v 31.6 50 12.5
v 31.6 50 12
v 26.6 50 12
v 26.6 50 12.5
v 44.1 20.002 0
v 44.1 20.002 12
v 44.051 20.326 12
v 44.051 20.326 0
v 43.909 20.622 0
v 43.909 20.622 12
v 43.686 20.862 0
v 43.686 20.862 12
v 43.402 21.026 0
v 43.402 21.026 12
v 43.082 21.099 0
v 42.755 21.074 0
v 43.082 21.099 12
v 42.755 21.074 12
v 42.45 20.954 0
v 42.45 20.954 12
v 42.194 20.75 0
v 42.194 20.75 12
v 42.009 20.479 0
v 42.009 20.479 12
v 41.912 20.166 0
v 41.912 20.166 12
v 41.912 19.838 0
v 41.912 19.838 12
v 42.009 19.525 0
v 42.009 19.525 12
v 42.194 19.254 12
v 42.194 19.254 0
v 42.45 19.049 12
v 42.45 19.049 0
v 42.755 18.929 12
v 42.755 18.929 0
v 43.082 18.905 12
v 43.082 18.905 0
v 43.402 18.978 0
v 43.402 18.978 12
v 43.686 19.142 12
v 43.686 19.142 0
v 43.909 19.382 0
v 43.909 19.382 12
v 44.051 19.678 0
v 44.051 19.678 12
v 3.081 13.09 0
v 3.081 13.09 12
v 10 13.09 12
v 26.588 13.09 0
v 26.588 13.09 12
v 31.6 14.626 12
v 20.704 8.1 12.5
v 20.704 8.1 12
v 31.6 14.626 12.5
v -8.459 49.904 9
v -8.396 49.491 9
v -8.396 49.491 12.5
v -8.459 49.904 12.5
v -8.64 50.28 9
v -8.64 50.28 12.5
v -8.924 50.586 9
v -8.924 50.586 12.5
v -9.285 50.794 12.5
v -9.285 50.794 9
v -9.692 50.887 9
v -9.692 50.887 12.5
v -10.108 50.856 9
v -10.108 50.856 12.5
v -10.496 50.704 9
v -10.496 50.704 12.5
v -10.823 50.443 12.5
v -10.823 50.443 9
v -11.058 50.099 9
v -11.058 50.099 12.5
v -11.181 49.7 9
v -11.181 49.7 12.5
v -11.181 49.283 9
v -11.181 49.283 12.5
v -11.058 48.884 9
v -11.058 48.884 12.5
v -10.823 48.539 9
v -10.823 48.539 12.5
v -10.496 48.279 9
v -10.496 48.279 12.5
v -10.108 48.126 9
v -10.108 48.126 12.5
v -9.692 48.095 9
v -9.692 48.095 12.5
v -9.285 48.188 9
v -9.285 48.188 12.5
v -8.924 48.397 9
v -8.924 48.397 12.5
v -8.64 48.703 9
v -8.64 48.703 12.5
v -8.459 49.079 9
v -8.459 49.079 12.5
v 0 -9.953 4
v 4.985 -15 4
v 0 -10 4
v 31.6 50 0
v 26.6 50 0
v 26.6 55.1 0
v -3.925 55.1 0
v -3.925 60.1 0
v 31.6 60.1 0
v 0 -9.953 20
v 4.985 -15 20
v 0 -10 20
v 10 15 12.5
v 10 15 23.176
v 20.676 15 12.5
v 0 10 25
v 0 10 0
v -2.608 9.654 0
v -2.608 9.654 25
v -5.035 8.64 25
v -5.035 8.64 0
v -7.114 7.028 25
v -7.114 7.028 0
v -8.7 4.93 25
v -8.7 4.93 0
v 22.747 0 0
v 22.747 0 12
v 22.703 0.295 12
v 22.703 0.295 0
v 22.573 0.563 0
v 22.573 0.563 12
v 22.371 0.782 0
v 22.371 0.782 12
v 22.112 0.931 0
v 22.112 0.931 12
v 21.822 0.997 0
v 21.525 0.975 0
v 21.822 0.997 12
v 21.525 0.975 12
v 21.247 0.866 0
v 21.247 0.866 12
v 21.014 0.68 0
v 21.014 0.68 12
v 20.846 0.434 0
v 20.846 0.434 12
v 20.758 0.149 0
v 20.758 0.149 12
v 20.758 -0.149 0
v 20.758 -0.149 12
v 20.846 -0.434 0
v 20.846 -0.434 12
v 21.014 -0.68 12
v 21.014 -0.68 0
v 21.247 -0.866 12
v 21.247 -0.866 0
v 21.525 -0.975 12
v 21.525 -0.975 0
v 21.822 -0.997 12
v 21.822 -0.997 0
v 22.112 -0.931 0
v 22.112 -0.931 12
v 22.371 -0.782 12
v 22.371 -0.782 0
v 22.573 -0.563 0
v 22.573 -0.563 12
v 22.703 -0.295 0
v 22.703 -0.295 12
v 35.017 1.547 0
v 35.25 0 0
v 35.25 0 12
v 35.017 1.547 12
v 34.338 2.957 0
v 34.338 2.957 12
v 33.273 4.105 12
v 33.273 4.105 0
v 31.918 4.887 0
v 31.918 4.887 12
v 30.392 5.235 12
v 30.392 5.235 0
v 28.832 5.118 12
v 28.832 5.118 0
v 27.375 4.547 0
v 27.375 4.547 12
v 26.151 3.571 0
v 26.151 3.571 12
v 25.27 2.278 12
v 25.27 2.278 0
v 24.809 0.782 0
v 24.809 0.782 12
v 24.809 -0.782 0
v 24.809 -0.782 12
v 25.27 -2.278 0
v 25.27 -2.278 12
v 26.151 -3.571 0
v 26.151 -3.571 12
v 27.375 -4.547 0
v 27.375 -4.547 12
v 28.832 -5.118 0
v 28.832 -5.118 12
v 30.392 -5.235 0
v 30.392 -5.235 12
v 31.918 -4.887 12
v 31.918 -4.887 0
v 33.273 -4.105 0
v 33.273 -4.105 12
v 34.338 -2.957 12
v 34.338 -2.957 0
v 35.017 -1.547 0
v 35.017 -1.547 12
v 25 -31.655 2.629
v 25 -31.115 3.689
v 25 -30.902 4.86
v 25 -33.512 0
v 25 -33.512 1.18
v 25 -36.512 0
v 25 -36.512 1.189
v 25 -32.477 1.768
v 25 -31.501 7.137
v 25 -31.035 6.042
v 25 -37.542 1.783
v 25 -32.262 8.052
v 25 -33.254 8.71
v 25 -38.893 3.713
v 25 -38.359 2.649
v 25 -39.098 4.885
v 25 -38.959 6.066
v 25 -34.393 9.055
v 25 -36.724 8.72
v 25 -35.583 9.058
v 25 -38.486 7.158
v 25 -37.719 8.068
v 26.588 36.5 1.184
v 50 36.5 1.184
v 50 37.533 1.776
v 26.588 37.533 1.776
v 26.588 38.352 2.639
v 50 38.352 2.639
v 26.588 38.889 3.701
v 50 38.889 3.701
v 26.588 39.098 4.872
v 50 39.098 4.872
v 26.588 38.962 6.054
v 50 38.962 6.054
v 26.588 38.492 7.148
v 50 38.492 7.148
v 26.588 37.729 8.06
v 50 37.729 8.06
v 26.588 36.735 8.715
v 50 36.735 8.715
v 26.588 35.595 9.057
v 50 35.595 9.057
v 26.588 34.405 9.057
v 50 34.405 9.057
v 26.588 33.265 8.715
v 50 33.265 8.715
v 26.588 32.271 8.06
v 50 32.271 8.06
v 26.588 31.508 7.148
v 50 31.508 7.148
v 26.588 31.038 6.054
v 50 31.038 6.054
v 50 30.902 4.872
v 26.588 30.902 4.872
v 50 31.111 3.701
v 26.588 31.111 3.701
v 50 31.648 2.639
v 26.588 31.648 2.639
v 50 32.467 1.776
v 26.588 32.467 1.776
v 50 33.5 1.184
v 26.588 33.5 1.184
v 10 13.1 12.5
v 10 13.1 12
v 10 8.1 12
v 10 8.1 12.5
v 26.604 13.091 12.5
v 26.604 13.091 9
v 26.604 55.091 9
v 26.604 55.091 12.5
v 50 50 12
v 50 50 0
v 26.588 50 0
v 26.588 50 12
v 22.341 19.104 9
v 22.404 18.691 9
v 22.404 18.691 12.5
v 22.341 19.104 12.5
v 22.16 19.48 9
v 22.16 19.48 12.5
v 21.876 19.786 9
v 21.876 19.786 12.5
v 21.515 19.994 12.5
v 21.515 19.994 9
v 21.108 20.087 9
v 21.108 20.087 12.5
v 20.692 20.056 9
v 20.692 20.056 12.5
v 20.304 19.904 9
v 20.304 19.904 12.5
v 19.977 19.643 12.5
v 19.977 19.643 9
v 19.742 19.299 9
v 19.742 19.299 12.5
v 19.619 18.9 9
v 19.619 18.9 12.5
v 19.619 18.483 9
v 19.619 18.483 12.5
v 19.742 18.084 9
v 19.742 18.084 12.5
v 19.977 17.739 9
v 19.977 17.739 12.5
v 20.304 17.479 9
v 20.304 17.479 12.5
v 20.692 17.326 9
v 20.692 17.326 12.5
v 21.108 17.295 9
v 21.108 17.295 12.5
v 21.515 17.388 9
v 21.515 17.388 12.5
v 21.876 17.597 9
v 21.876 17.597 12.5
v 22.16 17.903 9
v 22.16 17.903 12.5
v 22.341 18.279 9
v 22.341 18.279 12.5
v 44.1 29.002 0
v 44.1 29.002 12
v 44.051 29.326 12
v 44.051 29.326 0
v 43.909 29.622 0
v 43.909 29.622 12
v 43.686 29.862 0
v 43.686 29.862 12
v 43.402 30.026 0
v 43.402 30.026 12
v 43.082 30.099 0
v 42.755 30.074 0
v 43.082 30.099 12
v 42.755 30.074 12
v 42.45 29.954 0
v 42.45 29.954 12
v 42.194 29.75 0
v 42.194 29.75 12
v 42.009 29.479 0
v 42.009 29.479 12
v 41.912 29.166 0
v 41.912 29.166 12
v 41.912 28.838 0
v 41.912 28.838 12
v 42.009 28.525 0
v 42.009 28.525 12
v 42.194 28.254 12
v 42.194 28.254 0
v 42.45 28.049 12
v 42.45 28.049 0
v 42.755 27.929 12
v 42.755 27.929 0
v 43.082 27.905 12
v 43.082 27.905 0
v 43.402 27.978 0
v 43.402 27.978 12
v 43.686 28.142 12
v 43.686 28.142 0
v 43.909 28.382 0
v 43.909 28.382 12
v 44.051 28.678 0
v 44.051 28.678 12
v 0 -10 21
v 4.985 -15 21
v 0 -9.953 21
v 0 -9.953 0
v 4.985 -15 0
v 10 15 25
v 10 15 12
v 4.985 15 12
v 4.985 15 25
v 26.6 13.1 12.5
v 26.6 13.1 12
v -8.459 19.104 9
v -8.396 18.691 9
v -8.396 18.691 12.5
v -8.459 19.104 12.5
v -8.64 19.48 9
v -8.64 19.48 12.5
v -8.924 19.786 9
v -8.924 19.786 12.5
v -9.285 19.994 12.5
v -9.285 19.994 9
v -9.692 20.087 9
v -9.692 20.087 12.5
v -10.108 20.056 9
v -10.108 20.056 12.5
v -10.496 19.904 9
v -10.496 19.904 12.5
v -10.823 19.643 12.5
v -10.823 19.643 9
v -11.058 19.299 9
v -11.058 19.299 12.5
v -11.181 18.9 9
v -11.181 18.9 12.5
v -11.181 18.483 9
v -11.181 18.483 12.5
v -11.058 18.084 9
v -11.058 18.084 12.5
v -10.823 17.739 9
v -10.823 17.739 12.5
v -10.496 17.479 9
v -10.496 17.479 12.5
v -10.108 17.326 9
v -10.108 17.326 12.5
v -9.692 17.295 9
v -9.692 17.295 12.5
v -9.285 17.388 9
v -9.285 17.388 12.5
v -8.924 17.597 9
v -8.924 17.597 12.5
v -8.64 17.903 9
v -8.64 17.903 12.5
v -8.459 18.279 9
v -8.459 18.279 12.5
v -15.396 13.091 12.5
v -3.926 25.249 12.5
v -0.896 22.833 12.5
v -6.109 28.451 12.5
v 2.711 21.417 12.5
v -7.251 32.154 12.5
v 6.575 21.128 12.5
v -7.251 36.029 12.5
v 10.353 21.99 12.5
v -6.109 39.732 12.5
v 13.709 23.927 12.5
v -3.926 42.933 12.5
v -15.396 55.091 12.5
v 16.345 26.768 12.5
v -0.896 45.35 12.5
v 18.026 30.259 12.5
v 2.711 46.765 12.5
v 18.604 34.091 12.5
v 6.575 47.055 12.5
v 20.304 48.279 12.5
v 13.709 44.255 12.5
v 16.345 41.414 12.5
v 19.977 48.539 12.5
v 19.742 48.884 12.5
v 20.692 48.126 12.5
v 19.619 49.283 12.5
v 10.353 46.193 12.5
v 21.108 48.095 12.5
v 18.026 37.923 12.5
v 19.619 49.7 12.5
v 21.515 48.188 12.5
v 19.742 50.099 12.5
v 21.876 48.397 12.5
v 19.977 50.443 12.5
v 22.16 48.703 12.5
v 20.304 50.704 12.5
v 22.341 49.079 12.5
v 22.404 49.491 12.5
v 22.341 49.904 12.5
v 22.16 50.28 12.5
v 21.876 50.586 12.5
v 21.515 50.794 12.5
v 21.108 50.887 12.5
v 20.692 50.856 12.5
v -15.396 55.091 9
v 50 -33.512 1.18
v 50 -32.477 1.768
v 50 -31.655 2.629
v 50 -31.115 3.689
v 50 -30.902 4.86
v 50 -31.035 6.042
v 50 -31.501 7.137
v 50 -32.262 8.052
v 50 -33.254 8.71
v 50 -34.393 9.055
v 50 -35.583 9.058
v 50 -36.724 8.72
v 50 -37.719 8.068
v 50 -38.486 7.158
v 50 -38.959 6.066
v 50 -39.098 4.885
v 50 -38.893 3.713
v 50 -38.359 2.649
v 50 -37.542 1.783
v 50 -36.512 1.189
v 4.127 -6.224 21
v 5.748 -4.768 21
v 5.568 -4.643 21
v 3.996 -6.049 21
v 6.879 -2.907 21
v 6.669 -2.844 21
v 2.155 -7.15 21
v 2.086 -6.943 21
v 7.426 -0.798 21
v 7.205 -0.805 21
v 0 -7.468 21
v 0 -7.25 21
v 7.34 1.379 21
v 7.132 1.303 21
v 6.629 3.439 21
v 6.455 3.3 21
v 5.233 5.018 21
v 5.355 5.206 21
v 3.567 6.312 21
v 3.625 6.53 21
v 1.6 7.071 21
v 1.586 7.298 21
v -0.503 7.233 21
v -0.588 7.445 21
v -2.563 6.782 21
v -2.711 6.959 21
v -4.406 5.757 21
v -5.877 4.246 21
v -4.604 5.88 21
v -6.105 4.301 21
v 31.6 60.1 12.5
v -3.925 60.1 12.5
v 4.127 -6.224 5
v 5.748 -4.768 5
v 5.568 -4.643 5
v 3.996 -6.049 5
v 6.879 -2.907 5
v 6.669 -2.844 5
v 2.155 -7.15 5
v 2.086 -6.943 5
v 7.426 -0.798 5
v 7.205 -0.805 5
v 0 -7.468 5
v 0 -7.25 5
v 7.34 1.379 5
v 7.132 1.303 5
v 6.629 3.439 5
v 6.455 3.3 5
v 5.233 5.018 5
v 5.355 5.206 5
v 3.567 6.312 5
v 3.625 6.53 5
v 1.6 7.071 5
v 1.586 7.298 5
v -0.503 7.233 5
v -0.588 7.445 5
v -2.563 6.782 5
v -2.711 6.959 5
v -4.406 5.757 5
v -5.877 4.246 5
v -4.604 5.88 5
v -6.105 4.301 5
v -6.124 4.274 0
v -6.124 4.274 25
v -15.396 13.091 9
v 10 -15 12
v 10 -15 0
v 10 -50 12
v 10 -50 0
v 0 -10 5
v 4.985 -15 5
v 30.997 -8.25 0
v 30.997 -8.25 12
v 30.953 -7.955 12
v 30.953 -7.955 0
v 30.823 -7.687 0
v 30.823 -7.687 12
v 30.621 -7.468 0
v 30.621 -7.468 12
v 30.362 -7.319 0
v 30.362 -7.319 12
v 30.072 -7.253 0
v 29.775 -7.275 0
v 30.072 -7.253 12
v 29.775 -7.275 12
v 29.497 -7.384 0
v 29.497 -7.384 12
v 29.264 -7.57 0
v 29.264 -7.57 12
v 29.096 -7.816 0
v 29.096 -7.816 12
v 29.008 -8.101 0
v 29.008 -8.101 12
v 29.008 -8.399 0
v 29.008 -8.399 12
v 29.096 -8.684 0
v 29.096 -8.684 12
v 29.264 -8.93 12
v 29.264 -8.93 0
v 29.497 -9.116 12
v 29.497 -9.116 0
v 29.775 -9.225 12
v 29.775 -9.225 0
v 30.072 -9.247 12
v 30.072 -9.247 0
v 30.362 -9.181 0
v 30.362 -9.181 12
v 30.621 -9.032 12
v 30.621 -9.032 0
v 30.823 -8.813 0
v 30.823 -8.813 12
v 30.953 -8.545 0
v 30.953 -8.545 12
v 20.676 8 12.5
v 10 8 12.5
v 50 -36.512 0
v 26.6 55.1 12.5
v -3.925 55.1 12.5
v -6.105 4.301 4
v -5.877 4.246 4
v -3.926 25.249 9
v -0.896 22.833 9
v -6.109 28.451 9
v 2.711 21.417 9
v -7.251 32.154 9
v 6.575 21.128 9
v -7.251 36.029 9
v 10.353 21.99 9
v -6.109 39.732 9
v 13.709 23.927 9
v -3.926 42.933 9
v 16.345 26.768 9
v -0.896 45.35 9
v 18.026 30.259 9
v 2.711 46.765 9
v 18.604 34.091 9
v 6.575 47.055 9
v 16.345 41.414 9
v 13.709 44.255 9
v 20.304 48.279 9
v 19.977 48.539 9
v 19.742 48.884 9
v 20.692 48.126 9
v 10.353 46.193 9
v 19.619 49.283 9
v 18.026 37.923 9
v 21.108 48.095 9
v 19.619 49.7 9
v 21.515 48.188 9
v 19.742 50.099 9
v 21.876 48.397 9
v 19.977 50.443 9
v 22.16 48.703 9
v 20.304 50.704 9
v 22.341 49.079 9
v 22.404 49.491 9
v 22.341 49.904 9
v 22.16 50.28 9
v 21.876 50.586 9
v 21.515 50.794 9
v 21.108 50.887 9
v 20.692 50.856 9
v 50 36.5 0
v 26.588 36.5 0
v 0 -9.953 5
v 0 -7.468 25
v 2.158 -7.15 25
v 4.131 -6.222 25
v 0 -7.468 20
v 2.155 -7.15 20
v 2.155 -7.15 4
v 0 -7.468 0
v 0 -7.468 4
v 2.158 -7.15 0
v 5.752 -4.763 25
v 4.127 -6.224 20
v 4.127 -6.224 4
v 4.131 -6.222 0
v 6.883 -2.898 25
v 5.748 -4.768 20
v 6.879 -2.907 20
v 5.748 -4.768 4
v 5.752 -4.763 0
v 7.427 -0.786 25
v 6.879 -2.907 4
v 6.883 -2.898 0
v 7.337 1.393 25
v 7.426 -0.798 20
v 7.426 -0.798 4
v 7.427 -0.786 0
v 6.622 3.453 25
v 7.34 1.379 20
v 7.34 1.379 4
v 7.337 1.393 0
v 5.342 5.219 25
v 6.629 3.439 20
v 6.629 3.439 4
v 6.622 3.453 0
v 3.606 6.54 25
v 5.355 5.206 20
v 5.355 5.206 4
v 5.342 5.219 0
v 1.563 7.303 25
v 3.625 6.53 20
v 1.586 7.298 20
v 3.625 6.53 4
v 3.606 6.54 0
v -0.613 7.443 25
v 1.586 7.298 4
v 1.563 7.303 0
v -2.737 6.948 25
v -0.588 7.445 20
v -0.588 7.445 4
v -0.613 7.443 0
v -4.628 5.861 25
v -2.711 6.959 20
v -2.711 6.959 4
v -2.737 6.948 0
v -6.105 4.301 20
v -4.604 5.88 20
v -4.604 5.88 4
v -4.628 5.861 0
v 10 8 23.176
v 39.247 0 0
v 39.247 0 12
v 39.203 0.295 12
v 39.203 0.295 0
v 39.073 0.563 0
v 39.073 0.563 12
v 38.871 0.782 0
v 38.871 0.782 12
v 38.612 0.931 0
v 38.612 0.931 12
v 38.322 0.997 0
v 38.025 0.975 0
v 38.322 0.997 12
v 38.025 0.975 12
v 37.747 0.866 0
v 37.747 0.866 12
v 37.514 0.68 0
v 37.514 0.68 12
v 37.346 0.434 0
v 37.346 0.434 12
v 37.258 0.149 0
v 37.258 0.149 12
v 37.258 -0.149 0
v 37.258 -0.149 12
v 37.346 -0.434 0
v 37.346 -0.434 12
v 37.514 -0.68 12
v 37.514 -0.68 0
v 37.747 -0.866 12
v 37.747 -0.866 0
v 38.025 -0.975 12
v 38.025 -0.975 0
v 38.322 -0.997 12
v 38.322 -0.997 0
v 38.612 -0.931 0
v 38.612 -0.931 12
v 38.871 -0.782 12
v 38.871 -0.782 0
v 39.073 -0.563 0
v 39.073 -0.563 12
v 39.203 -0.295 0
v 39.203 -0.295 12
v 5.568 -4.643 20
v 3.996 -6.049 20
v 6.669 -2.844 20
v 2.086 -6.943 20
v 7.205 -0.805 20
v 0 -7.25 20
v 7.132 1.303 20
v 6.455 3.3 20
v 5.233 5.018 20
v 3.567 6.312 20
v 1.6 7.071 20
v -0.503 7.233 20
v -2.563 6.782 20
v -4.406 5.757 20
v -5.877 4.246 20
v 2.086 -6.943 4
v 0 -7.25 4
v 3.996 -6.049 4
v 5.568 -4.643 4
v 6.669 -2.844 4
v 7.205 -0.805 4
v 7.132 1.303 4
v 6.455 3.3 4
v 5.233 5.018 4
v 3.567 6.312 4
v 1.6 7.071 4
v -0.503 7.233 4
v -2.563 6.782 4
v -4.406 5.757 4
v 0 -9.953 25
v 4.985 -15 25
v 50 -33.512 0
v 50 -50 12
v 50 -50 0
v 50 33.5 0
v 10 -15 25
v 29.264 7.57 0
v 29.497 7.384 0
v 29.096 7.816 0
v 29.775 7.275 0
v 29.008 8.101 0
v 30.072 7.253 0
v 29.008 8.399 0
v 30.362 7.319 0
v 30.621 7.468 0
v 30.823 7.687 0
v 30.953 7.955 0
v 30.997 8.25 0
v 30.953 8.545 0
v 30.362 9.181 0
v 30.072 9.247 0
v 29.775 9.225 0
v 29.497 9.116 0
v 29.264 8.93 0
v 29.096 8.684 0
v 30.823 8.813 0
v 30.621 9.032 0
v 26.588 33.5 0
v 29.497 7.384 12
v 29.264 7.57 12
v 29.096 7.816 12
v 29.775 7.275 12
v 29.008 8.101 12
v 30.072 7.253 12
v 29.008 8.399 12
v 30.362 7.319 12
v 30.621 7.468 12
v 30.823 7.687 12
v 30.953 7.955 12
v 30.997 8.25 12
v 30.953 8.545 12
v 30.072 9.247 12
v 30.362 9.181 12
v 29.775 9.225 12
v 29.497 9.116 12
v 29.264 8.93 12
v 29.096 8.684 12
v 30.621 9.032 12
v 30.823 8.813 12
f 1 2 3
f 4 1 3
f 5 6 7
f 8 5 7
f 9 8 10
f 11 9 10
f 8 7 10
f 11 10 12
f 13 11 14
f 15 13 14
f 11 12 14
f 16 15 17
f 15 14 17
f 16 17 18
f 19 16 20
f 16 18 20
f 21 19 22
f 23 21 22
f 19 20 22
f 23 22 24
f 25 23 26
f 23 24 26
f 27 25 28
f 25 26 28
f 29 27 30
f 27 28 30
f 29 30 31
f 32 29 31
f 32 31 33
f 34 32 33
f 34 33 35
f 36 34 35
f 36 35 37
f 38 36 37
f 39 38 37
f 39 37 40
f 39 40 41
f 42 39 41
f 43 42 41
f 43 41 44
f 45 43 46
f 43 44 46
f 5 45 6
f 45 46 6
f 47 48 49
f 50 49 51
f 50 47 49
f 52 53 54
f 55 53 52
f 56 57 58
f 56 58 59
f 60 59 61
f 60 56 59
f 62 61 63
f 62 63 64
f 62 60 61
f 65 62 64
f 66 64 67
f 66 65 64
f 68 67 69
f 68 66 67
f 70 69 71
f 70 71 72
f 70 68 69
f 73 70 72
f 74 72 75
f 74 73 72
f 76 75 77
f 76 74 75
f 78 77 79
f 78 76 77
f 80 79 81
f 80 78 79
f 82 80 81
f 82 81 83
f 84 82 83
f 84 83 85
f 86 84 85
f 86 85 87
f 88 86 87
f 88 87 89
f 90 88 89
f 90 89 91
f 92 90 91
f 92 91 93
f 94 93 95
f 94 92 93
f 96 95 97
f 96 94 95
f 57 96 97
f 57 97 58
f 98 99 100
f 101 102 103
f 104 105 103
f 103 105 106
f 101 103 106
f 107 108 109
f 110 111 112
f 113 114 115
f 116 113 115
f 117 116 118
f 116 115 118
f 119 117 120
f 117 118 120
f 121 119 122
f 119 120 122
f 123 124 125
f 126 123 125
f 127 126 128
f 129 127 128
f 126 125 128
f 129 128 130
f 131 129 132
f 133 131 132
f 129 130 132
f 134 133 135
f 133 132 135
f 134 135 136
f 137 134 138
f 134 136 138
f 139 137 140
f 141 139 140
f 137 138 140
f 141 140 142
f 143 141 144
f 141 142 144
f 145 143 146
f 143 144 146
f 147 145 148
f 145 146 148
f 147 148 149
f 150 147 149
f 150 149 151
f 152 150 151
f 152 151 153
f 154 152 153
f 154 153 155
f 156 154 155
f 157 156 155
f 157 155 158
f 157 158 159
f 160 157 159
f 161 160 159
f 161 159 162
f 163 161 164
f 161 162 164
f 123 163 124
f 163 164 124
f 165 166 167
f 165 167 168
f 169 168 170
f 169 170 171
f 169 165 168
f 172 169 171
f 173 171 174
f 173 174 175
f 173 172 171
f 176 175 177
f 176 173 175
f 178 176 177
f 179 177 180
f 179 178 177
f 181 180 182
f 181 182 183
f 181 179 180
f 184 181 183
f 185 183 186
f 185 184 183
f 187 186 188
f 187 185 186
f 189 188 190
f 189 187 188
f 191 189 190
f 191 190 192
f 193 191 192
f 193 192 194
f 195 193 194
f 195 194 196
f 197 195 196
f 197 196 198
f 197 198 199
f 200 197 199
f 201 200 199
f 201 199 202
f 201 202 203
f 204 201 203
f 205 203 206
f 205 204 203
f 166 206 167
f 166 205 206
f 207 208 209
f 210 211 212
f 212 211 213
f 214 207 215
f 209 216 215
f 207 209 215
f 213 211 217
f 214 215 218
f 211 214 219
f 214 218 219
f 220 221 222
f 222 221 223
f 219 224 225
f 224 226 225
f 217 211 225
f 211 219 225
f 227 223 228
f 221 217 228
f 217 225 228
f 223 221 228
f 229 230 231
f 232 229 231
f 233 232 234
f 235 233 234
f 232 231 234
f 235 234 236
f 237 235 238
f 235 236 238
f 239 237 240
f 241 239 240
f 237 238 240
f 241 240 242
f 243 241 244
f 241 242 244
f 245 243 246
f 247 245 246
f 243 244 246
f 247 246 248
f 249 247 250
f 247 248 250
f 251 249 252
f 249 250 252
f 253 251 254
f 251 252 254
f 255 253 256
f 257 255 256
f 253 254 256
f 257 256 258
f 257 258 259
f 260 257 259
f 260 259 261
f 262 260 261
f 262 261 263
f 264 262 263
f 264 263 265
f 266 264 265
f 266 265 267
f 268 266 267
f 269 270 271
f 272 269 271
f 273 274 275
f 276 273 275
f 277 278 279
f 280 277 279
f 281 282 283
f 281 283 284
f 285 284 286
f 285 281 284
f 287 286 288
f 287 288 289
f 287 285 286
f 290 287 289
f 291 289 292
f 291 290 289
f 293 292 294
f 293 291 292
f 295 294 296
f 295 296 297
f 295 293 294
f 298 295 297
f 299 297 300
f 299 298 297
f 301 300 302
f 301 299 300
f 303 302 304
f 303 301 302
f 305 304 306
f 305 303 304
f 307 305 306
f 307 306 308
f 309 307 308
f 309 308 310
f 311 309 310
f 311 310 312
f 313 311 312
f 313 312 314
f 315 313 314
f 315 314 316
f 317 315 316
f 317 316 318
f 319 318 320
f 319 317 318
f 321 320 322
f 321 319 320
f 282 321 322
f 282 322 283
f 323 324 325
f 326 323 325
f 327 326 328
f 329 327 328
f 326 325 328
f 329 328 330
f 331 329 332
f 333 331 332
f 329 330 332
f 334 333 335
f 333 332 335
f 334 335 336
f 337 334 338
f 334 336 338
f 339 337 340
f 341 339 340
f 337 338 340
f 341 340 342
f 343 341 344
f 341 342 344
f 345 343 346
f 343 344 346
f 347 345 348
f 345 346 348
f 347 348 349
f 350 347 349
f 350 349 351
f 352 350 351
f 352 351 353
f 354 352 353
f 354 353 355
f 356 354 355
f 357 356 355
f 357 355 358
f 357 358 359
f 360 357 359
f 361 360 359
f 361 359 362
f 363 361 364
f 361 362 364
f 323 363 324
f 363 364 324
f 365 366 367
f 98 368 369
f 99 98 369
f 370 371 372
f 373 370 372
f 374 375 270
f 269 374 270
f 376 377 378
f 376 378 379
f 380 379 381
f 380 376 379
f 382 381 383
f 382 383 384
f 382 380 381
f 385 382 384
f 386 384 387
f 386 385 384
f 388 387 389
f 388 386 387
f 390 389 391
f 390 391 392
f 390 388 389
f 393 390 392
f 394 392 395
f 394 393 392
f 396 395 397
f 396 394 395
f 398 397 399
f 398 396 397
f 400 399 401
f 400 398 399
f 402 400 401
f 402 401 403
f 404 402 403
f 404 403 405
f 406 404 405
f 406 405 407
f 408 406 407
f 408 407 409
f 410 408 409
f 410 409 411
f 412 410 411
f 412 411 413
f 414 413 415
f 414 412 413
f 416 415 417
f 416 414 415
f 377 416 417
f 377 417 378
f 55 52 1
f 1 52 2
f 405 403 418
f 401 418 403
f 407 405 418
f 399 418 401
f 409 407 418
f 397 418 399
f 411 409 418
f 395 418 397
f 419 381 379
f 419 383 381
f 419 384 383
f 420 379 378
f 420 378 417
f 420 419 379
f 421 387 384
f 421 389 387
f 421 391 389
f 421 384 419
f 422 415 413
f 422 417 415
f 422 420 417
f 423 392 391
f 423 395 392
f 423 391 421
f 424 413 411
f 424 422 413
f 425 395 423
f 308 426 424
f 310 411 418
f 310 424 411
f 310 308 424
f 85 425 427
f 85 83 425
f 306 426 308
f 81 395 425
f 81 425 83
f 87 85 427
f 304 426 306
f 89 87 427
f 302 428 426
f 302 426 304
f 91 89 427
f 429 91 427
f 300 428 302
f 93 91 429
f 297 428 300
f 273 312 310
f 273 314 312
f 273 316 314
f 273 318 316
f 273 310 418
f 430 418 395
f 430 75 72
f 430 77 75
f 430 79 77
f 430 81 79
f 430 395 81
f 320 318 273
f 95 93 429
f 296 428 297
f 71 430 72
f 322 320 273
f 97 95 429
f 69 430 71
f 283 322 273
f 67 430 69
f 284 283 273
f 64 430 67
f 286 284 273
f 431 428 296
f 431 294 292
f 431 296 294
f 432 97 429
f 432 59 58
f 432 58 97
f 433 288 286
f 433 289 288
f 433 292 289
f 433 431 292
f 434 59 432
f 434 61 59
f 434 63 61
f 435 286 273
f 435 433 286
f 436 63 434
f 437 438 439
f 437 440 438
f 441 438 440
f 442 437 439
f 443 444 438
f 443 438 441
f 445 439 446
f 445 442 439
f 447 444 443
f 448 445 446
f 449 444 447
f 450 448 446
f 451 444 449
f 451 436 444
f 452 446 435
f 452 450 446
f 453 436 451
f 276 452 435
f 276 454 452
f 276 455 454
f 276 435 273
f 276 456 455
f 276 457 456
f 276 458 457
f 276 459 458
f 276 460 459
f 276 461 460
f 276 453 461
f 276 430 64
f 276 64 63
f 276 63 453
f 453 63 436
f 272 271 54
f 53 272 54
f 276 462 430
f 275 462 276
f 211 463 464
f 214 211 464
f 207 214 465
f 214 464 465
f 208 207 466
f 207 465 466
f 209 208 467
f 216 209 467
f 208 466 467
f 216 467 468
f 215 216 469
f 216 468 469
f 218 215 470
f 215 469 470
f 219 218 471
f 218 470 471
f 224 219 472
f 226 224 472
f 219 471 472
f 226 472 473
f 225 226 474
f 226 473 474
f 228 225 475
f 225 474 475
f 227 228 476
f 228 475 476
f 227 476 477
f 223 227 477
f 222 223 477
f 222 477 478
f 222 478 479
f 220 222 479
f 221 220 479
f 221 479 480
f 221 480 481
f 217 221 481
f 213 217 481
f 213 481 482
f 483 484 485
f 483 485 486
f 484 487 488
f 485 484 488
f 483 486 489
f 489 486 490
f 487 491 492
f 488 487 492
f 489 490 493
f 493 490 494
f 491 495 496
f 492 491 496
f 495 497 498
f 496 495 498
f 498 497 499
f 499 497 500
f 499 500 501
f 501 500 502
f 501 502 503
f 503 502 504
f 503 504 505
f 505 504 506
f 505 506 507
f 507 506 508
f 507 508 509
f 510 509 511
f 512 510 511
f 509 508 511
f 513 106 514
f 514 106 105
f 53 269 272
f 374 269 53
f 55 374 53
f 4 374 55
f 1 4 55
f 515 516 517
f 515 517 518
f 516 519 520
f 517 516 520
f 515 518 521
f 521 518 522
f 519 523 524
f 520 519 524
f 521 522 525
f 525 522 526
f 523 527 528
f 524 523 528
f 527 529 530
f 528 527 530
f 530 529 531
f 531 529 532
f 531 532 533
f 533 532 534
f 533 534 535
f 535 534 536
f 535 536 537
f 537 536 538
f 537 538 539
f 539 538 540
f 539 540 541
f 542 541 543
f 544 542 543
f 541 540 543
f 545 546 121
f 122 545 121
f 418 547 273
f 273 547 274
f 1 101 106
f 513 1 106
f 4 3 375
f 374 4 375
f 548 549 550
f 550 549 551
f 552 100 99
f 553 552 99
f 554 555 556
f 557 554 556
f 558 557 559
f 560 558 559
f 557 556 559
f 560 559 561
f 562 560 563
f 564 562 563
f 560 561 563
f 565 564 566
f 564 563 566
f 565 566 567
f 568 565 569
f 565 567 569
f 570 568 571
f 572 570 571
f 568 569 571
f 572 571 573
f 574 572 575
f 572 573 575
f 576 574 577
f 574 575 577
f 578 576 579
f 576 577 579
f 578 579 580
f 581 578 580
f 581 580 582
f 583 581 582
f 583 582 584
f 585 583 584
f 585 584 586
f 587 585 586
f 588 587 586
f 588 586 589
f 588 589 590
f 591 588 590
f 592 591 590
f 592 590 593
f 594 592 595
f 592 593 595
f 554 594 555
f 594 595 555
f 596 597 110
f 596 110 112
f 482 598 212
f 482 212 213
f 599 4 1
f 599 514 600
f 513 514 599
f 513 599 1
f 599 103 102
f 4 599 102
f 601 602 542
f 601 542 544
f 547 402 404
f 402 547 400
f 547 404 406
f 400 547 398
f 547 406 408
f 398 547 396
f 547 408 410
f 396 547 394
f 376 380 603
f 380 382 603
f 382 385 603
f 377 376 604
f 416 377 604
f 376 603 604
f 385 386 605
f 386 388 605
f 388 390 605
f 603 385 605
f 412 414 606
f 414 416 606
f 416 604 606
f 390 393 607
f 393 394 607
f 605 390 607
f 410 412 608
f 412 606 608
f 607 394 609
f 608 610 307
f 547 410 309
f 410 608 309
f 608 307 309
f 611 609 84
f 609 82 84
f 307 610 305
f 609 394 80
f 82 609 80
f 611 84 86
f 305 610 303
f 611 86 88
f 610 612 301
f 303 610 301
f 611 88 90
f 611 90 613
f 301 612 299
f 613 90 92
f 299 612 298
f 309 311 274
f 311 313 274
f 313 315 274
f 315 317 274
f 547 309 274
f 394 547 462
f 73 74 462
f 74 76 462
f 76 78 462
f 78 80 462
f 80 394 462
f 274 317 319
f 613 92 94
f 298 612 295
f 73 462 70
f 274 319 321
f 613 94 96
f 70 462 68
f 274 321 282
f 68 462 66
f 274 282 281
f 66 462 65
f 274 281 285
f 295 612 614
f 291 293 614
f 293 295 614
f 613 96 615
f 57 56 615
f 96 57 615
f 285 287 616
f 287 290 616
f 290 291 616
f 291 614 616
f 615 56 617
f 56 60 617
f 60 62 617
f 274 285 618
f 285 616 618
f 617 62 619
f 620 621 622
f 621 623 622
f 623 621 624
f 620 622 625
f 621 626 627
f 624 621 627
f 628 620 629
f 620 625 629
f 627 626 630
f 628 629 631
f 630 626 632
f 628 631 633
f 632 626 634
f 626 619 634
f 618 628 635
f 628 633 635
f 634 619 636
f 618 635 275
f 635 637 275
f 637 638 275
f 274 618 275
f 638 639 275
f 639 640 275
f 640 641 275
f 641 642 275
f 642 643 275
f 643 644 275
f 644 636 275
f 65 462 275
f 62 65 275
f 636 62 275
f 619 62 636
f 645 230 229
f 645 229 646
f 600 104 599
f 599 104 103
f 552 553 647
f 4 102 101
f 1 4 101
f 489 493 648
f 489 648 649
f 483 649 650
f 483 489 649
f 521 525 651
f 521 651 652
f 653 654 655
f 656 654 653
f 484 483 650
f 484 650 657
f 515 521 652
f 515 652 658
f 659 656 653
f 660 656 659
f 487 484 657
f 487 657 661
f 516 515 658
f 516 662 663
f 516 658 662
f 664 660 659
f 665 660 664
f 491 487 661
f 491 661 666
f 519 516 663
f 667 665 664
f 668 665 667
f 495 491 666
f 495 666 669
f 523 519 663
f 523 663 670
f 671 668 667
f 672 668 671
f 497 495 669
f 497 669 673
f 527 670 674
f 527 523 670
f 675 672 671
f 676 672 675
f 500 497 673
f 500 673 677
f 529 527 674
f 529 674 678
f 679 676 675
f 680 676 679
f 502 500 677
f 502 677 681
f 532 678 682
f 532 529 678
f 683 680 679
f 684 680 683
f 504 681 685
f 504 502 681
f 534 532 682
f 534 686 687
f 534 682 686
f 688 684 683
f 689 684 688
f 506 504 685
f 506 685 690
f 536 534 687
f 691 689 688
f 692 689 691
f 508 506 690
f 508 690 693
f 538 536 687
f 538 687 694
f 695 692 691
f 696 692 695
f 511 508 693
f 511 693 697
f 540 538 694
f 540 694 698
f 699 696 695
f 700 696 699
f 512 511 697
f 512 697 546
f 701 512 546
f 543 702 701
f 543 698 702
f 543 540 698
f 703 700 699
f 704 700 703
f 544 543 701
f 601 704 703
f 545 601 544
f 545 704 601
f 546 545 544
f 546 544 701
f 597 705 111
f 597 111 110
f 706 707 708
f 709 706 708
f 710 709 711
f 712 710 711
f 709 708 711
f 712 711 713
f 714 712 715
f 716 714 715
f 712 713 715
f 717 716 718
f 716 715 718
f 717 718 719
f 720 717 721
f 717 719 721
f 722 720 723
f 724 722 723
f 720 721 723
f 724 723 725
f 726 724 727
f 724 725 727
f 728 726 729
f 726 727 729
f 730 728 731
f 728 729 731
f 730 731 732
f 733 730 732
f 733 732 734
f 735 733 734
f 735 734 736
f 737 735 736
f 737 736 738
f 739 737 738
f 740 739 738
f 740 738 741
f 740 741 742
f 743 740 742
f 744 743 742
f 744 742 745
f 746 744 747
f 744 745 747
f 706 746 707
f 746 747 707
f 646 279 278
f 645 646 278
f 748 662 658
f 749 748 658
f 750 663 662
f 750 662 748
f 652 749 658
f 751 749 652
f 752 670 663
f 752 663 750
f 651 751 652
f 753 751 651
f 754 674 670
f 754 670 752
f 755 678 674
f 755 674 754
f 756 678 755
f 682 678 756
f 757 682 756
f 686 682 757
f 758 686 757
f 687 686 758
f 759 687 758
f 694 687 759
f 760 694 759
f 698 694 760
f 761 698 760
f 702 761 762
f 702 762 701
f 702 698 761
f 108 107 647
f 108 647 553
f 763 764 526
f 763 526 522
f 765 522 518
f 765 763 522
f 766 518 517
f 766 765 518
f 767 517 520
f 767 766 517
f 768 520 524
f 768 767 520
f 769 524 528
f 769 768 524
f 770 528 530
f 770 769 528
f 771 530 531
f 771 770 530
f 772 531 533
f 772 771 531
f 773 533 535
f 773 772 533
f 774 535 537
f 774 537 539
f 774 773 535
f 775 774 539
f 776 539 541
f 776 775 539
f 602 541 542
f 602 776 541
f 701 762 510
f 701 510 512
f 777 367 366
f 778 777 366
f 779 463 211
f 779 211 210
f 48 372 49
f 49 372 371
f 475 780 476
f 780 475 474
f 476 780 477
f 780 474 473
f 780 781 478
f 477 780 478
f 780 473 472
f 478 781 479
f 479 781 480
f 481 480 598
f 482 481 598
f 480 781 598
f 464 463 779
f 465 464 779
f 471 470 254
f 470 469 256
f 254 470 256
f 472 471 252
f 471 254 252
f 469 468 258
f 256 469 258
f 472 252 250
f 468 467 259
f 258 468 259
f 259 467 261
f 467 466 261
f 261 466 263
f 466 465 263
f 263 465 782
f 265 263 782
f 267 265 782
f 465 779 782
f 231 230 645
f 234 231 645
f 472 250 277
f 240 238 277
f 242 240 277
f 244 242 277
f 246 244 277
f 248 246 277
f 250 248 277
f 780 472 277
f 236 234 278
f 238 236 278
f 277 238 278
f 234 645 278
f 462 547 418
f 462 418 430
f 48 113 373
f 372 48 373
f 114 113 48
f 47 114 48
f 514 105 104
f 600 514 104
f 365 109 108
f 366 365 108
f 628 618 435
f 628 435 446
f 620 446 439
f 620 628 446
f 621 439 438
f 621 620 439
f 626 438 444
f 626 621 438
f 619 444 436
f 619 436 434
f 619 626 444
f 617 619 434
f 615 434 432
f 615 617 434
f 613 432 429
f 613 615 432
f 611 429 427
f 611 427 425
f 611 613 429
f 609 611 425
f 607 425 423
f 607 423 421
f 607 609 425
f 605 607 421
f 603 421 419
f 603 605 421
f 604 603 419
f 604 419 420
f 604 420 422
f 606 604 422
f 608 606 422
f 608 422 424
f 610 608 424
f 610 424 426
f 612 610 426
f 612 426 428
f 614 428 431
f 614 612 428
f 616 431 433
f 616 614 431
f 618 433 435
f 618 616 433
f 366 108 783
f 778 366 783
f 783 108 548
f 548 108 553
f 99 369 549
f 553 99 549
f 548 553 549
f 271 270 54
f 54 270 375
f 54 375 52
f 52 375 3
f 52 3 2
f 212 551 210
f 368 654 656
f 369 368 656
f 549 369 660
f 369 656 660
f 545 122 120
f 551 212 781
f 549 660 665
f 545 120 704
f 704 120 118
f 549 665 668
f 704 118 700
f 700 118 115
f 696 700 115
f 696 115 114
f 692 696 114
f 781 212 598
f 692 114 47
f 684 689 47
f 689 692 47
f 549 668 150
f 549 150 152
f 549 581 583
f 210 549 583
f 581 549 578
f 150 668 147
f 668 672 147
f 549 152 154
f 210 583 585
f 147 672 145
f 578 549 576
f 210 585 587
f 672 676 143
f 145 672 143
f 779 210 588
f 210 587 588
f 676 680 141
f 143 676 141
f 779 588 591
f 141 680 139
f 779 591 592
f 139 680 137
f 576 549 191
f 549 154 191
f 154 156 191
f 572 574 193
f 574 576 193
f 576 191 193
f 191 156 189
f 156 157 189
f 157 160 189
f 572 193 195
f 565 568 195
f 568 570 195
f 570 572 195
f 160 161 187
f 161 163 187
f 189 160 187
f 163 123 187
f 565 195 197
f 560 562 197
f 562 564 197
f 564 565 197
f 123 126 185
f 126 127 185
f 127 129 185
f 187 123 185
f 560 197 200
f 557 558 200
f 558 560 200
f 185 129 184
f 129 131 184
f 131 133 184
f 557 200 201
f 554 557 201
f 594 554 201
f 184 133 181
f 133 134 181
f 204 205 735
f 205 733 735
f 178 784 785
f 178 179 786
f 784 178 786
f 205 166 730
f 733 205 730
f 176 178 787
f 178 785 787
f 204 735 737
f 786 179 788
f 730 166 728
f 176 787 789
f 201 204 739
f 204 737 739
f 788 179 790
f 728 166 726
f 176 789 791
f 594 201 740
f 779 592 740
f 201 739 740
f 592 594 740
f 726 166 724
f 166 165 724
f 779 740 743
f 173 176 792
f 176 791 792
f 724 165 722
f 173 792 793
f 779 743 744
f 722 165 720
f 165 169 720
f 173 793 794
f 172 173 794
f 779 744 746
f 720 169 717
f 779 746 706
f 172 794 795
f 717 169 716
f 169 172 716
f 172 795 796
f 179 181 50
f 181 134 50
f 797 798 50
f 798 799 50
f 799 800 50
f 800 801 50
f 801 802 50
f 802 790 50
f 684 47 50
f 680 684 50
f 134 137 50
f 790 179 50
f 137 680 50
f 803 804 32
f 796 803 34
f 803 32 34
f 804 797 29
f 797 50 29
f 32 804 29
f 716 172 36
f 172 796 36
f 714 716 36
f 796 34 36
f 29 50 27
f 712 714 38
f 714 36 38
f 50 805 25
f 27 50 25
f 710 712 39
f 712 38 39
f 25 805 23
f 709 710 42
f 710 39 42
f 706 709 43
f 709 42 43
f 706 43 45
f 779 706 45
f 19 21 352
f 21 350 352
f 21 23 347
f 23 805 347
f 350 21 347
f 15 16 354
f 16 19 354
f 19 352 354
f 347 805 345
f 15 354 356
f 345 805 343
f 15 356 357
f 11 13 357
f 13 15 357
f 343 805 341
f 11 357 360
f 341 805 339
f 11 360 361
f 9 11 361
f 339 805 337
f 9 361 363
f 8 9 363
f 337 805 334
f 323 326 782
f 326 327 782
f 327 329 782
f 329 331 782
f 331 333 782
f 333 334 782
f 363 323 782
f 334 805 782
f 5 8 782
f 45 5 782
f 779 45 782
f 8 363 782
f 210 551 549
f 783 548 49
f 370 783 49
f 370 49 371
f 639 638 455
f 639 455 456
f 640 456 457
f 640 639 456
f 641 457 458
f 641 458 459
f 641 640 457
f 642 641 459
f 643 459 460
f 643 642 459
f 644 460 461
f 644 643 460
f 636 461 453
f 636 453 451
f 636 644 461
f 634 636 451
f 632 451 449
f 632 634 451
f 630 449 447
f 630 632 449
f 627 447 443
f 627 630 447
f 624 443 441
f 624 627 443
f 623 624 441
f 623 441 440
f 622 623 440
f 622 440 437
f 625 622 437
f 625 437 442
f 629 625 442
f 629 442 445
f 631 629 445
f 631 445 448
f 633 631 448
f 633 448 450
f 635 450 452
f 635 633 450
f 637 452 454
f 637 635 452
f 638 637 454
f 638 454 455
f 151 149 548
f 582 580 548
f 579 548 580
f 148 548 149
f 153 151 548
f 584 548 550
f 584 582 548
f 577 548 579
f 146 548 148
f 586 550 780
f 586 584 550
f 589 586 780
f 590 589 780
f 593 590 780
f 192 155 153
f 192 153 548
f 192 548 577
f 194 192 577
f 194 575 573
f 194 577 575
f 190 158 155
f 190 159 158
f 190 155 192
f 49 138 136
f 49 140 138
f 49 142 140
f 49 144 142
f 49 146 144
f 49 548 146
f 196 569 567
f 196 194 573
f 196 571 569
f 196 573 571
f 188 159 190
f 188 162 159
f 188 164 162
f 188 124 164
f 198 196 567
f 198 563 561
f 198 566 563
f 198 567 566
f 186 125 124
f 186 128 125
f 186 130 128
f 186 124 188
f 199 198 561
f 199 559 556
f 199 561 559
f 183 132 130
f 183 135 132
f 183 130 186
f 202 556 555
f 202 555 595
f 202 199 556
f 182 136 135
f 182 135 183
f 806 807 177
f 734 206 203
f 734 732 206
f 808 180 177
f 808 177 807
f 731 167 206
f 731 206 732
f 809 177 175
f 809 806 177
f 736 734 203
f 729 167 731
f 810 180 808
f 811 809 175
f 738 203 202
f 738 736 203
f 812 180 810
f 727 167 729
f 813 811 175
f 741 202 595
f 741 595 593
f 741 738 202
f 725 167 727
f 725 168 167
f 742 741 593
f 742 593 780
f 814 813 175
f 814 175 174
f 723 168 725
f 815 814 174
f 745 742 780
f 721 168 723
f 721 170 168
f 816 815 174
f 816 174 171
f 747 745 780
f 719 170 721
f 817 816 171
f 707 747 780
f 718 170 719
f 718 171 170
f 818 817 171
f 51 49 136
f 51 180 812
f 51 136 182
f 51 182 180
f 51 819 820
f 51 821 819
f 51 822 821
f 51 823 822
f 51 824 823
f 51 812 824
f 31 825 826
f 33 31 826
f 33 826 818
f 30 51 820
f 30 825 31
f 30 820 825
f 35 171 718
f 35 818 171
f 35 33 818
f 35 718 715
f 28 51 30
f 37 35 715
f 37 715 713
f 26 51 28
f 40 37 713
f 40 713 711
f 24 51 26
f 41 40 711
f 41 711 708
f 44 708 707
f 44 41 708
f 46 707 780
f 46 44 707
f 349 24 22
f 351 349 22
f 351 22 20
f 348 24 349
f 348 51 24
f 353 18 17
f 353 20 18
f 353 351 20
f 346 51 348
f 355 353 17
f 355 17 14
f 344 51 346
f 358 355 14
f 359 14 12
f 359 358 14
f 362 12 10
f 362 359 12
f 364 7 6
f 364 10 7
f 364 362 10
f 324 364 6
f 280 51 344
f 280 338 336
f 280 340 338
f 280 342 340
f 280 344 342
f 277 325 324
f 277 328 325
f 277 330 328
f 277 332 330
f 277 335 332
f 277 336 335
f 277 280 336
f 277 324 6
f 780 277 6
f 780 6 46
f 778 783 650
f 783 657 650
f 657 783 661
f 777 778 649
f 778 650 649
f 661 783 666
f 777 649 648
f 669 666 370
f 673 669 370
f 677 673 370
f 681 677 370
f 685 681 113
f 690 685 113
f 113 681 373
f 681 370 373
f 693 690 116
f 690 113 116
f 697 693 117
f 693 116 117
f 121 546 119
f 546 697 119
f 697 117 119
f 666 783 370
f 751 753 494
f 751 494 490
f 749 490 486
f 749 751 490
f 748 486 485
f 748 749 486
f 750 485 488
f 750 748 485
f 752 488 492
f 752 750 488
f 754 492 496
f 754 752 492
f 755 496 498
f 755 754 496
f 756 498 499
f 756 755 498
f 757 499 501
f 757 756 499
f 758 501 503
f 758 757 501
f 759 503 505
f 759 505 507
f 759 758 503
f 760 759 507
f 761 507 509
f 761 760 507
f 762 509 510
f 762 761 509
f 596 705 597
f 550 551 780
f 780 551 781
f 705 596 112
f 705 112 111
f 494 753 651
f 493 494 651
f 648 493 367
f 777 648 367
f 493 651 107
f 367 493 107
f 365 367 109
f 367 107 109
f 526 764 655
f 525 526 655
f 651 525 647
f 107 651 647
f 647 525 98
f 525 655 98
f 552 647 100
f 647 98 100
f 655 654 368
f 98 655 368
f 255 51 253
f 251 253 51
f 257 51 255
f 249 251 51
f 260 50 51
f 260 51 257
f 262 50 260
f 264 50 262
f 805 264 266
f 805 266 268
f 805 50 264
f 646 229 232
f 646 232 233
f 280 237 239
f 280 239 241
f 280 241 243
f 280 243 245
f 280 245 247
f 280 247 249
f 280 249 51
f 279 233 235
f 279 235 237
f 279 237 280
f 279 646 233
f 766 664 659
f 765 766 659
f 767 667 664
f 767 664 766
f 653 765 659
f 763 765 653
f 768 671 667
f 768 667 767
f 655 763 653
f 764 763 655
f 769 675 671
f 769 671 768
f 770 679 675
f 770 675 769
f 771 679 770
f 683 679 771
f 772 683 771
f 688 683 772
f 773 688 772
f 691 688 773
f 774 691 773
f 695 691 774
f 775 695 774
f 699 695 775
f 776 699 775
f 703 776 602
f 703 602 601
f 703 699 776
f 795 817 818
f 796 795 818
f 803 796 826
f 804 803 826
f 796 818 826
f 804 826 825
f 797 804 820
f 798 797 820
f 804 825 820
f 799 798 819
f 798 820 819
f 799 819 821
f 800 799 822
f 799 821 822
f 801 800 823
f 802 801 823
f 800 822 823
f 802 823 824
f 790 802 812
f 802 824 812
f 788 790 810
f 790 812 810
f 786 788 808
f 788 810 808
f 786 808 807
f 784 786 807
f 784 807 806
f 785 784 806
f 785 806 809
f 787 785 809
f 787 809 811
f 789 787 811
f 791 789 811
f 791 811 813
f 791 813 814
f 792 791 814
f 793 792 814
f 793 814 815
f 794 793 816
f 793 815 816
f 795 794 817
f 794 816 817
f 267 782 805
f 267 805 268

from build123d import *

# Parameters (mm, degrees)
SKETCH018_W     = 42
SKETCH018_H     = 42
SKETCH018_R     = 13
SKETCH018_R_2   = 1.4
PAD018_DEPTH    = 3.5
PAD020_DEPTH    = 0.5
POCKET003_DEPTH = 30
PAD022_DEPTH    = 12.5
PAD026_DEPTH    = 7
SKETCH019_W     = 42
SKETCH019_H     = 42
PAD019_DEPTH    = 12
SKETCH_R        = 5.25
PAD_DEPTH       = 12
POCKET_DEPTH    = 25
SKETCH005_R     = 1
POCKET001_DEPTH = 12
SKETCH014_R     = 1.1
POCKET002_DEPTH = 12
PAD016_DEPTH    = 1
PAD017_DEPTH    = 1
PAD015_DEPTH    = 25


with BuildPart() as pad018:
    # Sketch018 → Pad018 (new body)
    with BuildSketch(Plane(origin=(14.7, 64.62, 9), x_dir=(1, 0, 0), z_dir=(0, 0, 1))):
        with Locations((-9.096434, -30.528784)):
            Rectangle(SKETCH018_W, SKETCH018_H)
        with Locations((-9.096434, -30.528784)):
            Circle(SKETCH018_R, mode=Mode.SUBTRACT)
        with Locations((6.303566, -15.128784)):
            Circle(SKETCH018_R_2, mode=Mode.SUBTRACT)
        with Locations((6.303566, -45.928784)):
            Circle(SKETCH018_R_2, mode=Mode.SUBTRACT)
        with Locations((-24.496434, -15.128784)):
            Circle(SKETCH018_R_2, mode=Mode.SUBTRACT)
        with Locations((-24.496434, -45.928784)):
            Circle(SKETCH018_R_2, mode=Mode.SUBTRACT)
    extrude(amount=PAD018_DEPTH)


with BuildPart() as pocket003:
    # Sketch020 → Pad020 (new body)
    with BuildSketch(Plane.XY.offset(12)):
        Polygon((26.6, 13.1), (10, 13.1), (10, 8.1), (31.6, 8.1), (31.6, 50), (26.6, 50), align=None)
    extrude(amount=PAD020_DEPTH)

    # Sketch021 → Pocket003 (cut)
    with BuildSketch(Plane.XY.offset(12.5)):
        Polygon((20.278515, 7.845065), (31.887259, 14.79844), (31.887259, 7.845065), align=None)
    extrude(amount=-POCKET003_DEPTH, mode=Mode.SUBTRACT)


with BuildPart() as pad022:
    # Sketch024 → Pad022 (new body)
    with BuildSketch(Plane.XY):
        Polygon((26.6, 50), (31.6, 50), (31.6, 60.1), (-3.925276, 60.1), (-3.925276, 55.1), (26.6, 55.1), align=None)
    extrude(amount=PAD022_DEPTH)


with BuildPart() as pad026:
    # Sketch028 → Pad026 (new body)
    with BuildSketch(Plane(origin=(0, 8, -14), x_dir=(1, 0, 0), z_dir=(0, -1, 0))):
        Polygon((10, 37.176065), (10, 26.5), (20.676065, 26.5), align=None)
    extrude(amount=-PAD026_DEPTH)


with BuildPart() as cut001:
    # Sketch019 → Pad019 (new body)
    with BuildSketch(Plane.XY):
        with Locations((5.587691, 34.090154)):
            Rectangle(SKETCH019_W, SKETCH019_H)
    extrude(amount=PAD019_DEPTH)


with BuildPart() as pocket002:
    # Sketch → Pad (new body)
    with BuildSketch(Plane.XY):
        Polygon((50, -50), (50, 50), (10, 50), (10, 20), (10, -13.385166), (10, -50), align=None)
        with Locations((30, 0)):
            Circle(SKETCH_R, mode=Mode.SUBTRACT)
    extrude(amount=PAD_DEPTH)

    # Sketch001 → Pocket (cut)
    with BuildSketch(Plane.YZ.offset(50)):
        with BuildLine():
            Line((-33.511602, 1.179703), (-33.511602, 0))
            Line((-33.511602, 0), (-36.511602, 0))
            Line((-36.511602, 0), (-36.511602, 1.188825))
            ThreePointArc((-33.511602, 1.179703), (-34.987533, 9.099981), (-36.511602, 1.188825))
        make_face()
        with BuildLine():
            Line((36.5, 1.184243), (36.5, 0))
            Line((36.5, 0), (33.5, 0))
            Line((33.5, 0), (33.5, 1.184243))
            ThreePointArc((36.5, 1.184243), (35, 9.1), (33.5, 1.184243))
        make_face()
    extrude(amount=-POCKET_DEPTH, mode=Mode.SUBTRACT)

    # Sketch005 → Pocket001 (cut)
    with BuildSketch(Plane.XY.offset(12)):
        with Locations((29.99715, 8.25)):
            Circle(SKETCH005_R)
        with Locations((21.74715, 0)):
            Circle(SKETCH005_R)
        with Locations((38.24715, 0)):
            Circle(SKETCH005_R)
        with Locations((29.99715, -8.25)):
            Circle(SKETCH005_R)
    extrude(amount=-POCKET001_DEPTH, mode=Mode.SUBTRACT)

    # Sketch014 → Pocket002 (cut)
    with BuildSketch(Plane.XY.offset(12)):
        with Locations((43, 29.001852)):
            Circle(SKETCH014_R)
        with Locations((43, 20.001852)):
            Circle(SKETCH014_R)
    extrude(amount=-POCKET002_DEPTH, mode=Mode.SUBTRACT)


with BuildPart() as pad016:
    # Sketch016 → Pad016 (new body)
    with BuildSketch(Plane.XY.offset(32)):
        with BuildLine():
            Line((-5.8767, 4.245809), (-8.700179, 4.930201))
            ThreePointArc((0, 10), (-5.034779, 8.640081), (-8.700179, 4.930201))
            Line((0, 10), (4.98503, 15))
            Line((10, 15), (4.98503, 15))
            Line((10, -15), (10, 15))
            Line((4.98503, -15), (10, -15))
            Line((0, -10), (4.98503, -15))
            Line((0, -7.25), (0, -10))
            ThreePointArc((0, -7.25), (6.455409, 3.300029), (-5.8767, 4.245809))
        make_face()
    extrude(amount=PAD016_DEPTH)


with BuildPart() as pad017:
    # Sketch017 → Pad017 (new body)
    with BuildSketch(Plane.XY.offset(48)):
        with BuildLine():
            Line((-5.8767, 4.245809), (-8.700179, 4.930201))
            ThreePointArc((0, 10), (-5.034779, 8.640081), (-8.700179, 4.930201))
            Line((0, 10), (4.98503, 15))
            Line((10, 15), (4.98503, 15))
            Line((10, -15), (10, 15))
            Line((4.98503, -15), (10, -15))
            Line((0, -10), (4.98503, -15))
            Line((0, -7.25), (0, -10))
            ThreePointArc((0, -7.25), (6.455409, 3.300029), (-5.8767, 4.245809))
        make_face()
    extrude(amount=PAD017_DEPTH)


with BuildPart() as cut:
    # Sketch015 → Pad015 (new body)
    with BuildSketch(Plane.XY.offset(28)):
        with BuildLine():
            Line((-6.124049, 4.274369), (-8.700179, 4.930201))
            ThreePointArc((0, 10), (-5.034779, 8.640081), (-8.700179, 4.930201))
            Line((0, 10), (4.98503, 15))
            Line((10, 15), (4.98503, 15))
            Line((10, -15), (10, 15))
            Line((4.98503, -15), (10, -15))
            Line((0, -9.952784), (4.98503, -15))
            Line((0, -7.468213), (0, -9.952784))
            ThreePointArc((0, -7.468213), (6.621786, 3.453426), (-6.124049, 4.274369))
        make_face()
    extrude(amount=PAD015_DEPTH)

    # Fusion: union Pad016, Pad017
    add(pad016.part)
    add(pad017.part)


with BuildPart() as cut_1:
    # Fusion placement: moved
    add(cut.part.moved(Location((0, 0, -28))))

    # Fusion001: union Pocket002
    add(pocket002.part)

    # Cut: cut Cut001
    add(cut001.part, mode=Mode.SUBTRACT)


solid = Compound([pad018.part, pocket003.part, pad022.part, pad026.part, cut_1.part])
